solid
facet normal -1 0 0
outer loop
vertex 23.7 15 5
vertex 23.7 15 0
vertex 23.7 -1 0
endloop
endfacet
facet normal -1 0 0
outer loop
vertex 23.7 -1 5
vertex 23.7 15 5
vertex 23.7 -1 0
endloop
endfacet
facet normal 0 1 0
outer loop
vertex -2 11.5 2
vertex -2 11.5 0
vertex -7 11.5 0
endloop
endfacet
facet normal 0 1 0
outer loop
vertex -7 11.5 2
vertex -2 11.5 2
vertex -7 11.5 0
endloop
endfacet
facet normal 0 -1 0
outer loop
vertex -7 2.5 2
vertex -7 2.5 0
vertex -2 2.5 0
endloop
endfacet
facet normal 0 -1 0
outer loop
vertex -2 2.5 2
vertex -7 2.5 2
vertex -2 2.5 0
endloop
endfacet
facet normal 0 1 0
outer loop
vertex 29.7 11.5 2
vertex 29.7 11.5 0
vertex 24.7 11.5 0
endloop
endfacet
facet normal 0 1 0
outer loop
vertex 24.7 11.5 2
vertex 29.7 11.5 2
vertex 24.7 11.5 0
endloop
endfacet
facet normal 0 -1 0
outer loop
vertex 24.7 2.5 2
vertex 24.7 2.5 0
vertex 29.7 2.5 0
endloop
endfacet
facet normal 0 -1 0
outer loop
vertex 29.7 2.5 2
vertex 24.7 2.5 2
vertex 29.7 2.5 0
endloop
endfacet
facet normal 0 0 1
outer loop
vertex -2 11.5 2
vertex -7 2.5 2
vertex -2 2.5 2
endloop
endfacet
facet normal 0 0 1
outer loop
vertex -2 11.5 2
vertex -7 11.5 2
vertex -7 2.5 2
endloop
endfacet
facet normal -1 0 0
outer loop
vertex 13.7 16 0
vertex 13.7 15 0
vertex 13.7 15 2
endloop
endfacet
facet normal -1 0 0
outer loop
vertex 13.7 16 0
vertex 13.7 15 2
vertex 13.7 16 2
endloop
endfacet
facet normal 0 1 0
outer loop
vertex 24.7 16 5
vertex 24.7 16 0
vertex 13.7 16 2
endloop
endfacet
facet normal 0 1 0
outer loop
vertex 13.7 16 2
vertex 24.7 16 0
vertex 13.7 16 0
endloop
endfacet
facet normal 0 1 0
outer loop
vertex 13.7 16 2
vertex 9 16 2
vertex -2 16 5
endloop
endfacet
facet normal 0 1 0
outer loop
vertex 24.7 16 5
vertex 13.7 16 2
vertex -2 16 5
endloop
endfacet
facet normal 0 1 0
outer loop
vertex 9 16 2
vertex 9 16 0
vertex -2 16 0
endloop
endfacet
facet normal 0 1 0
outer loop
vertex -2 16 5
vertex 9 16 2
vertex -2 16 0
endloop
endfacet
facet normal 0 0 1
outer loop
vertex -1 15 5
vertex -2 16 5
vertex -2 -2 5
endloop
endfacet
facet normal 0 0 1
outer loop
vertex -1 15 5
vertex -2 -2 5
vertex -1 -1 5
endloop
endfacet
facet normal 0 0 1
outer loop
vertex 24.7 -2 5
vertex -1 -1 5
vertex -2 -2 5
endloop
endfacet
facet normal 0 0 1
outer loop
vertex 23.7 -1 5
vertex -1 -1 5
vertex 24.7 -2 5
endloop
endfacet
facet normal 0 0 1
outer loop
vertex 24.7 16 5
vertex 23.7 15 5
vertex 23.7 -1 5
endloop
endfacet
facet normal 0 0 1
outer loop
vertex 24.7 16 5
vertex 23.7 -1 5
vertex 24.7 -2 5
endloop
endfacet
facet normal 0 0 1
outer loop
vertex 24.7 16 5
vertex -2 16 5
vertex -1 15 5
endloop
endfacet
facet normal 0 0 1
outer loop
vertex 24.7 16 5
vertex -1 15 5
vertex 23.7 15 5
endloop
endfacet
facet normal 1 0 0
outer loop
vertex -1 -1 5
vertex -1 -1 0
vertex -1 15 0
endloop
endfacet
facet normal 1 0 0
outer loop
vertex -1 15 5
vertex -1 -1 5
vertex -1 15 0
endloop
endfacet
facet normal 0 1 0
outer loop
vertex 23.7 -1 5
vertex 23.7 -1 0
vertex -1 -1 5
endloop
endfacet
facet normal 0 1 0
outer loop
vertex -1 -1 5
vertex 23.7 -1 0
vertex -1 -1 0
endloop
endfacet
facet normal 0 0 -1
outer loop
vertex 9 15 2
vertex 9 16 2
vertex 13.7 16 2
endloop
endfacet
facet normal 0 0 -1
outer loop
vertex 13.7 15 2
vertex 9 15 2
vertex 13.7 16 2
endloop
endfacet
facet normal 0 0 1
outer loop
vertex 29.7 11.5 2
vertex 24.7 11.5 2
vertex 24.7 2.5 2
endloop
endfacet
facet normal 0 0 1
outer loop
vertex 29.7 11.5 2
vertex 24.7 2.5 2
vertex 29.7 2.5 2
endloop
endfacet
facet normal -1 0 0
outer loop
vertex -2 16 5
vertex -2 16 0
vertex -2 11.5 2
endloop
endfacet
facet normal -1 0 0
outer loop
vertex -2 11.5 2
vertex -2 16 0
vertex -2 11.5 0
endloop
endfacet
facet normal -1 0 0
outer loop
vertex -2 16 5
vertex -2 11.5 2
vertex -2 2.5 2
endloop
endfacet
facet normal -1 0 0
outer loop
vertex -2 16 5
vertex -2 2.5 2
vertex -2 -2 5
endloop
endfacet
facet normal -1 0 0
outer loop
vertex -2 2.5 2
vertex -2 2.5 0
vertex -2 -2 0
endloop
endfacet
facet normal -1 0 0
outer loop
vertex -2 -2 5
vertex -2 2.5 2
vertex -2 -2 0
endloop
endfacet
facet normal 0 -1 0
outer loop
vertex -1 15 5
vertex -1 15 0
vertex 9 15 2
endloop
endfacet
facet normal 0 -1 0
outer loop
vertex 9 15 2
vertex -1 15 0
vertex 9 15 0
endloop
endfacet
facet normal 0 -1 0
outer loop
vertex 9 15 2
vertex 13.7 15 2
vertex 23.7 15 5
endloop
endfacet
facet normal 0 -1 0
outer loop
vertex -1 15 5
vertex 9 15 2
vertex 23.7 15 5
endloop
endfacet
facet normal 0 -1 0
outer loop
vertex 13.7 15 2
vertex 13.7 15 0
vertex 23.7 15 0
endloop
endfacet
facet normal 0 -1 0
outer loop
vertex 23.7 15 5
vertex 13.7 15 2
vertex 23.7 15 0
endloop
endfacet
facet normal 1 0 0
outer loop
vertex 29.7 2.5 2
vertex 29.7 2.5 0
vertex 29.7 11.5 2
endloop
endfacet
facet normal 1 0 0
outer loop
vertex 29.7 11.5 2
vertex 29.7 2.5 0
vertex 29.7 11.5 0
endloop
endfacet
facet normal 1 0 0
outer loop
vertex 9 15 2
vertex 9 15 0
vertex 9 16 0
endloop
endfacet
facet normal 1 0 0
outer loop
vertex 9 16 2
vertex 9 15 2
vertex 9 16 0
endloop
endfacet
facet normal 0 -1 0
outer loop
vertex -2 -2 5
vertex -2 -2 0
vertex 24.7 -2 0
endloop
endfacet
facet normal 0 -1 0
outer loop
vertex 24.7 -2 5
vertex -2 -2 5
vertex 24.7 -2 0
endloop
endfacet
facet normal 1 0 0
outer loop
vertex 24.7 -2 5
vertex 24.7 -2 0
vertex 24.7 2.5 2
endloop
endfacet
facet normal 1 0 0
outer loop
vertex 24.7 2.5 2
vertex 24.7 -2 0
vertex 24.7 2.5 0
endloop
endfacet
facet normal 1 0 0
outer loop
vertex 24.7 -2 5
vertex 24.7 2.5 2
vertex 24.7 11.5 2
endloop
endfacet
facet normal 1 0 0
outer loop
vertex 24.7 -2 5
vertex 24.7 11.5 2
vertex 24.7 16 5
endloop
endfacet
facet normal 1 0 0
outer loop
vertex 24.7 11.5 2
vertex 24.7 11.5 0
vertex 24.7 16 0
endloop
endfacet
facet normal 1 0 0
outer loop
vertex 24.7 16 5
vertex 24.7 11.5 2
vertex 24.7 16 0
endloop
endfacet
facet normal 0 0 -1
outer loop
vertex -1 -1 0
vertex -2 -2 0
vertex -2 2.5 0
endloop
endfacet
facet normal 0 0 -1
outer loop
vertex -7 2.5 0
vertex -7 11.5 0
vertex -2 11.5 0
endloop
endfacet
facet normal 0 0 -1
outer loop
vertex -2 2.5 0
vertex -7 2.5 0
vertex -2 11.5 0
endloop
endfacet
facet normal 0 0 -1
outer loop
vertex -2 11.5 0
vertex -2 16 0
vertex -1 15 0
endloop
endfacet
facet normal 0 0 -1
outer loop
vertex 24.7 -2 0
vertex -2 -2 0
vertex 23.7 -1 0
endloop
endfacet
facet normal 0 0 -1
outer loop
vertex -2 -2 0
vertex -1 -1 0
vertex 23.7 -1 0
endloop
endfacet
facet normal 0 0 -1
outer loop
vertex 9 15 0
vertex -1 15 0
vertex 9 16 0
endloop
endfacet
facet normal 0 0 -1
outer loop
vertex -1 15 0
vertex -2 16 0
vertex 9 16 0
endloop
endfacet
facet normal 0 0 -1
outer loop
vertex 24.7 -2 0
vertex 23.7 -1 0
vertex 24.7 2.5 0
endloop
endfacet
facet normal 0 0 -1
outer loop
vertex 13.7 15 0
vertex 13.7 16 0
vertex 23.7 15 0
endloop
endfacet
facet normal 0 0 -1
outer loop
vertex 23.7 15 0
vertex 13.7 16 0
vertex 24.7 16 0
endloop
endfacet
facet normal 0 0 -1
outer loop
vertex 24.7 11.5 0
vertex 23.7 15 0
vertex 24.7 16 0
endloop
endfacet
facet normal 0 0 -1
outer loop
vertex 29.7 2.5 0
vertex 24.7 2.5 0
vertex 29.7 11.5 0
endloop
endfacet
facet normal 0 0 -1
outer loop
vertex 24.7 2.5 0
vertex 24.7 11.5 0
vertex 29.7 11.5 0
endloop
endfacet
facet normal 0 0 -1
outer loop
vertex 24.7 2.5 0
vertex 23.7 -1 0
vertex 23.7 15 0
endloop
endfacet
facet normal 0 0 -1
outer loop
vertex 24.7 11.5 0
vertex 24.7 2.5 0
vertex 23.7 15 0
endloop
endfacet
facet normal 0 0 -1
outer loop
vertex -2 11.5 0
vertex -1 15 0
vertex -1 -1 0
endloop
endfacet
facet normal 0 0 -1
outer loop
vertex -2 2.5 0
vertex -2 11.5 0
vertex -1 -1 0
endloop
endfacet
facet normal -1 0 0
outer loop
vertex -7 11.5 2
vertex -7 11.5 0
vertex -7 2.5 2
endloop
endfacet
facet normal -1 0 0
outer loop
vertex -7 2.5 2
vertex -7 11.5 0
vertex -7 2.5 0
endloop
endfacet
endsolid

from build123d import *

# Parameters (mm, degrees)
F0_W     = 3
F0_H     = 5
F0_W_2   = 1
F0_H_2   = 1
F1_DEPTH = 2
F0_W_3   = 4.7
F2_DEPTH = 5
F3_DEPTH = 2


with BuildPart() as f1:
    # F0 (on Top) → F1 (new body)
    with BuildSketch(Plane.XY):
        with Locations((26.2, 7)):
            Rectangle(F0_W, F0_H)
        Polygon((-2, 10.5), (-1, 10.5), (-1, 15), (9, 15), (9, 16), (-2, 16), (-2, 11.5), align=None)
        with Locations((-3.5, 7)):
            Rectangle(F0_W, F0_H)
        Polygon((-2, 3.5), (-2, 4.5), (-5, 4.5), (-5, 9.5), (-2, 9.5), (-2, 10.5), (-6, 10.5), (-6, 3.5), align=None)
        Polygon((27.7, 4.5), (24.7, 4.5), (24.7, 3.5), (28.7, 3.5), (28.7, 10.5), (24.7, 10.5), (24.7, 9.5), (27.7, 9.5), align=None)
        Polygon((-2, 2.5), (-2, 3.5), (-6, 3.5), (-6, 10.5), (-2, 10.5), (-2, 11.5), (-7, 11.5), (-7, 2.5), align=None)
        Polygon((-1, -1), (-1, 3.5), (-2, 3.5), (-2, 2.5), (-2, -2), (24.7, -2), (24.7, 2.5), (24.7, 3.5), (23.7, 3.5), (23.7, -1), align=None)
        with Locations((-1.5, 7)):
            Rectangle(F0_W_2, F0_H)
        with Locations((-1.5, 4)):
            Rectangle(F0_W_2, F0_H_2)
        with Locations((24.2, 4)):
            Rectangle(F0_W_2, F0_H_2)
        with Locations((24.2, 7)):
            Rectangle(F0_W_2, F0_H)
        with Locations((24.2, 10)):
            Rectangle(F0_W_2, F0_H_2)
        Polygon((23.7, 15), (23.7, 10.5), (24.7, 10.5), (24.7, 11.5), (24.7, 16), (13.7, 16), (13.7, 15), align=None)
        Polygon((28.7, 3.5), (24.7, 3.5), (24.7, 2.5), (29.7, 2.5), (29.7, 11.5), (24.7, 11.5), (24.7, 10.5), (28.7, 10.5), align=None)
        with Locations((-1.5, 10)):
            Rectangle(F0_W_2, F0_H_2)
    extrude(amount=F1_DEPTH)

    # F0 (on Top) → F2 (join)
    with BuildSketch(Plane.XY):
        Polygon((-2, 10.5), (-1, 10.5), (-1, 15), (9, 15), (9, 16), (-2, 16), (-2, 11.5), align=None)
        with Locations((11.35, 15.5)):
            Rectangle(F0_W_3, F0_H_2)
        Polygon((23.7, 15), (23.7, 10.5), (24.7, 10.5), (24.7, 11.5), (24.7, 16), (13.7, 16), (13.7, 15), align=None)
        with Locations((24.2, 10)):
            Rectangle(F0_W_2, F0_H_2)
        with Locations((24.2, 7)):
            Rectangle(F0_W_2, F0_H)
        Polygon((-1, -1), (-1, 3.5), (-2, 3.5), (-2, 2.5), (-2, -2), (24.7, -2), (24.7, 2.5), (24.7, 3.5), (23.7, 3.5), (23.7, -1), align=None)
        with Locations((24.2, 4)):
            Rectangle(F0_W_2, F0_H_2)
        with Locations((-1.5, 4)):
            Rectangle(F0_W_2, F0_H_2)
        with Locations((-1.5, 7)):
            Rectangle(F0_W_2, F0_H)
        with Locations((-1.5, 10)):
            Rectangle(F0_W_2, F0_H_2)
    extrude(amount=F2_DEPTH)

    # F0 (on Top) → F3 (cut)
    with BuildSketch(Plane.XY):
        with Locations((11.35, 15.5)):
            Rectangle(F0_W_3, F0_H_2)
    extrude(amount=F3_DEPTH, mode=Mode.SUBTRACT)


solid = f1.part
